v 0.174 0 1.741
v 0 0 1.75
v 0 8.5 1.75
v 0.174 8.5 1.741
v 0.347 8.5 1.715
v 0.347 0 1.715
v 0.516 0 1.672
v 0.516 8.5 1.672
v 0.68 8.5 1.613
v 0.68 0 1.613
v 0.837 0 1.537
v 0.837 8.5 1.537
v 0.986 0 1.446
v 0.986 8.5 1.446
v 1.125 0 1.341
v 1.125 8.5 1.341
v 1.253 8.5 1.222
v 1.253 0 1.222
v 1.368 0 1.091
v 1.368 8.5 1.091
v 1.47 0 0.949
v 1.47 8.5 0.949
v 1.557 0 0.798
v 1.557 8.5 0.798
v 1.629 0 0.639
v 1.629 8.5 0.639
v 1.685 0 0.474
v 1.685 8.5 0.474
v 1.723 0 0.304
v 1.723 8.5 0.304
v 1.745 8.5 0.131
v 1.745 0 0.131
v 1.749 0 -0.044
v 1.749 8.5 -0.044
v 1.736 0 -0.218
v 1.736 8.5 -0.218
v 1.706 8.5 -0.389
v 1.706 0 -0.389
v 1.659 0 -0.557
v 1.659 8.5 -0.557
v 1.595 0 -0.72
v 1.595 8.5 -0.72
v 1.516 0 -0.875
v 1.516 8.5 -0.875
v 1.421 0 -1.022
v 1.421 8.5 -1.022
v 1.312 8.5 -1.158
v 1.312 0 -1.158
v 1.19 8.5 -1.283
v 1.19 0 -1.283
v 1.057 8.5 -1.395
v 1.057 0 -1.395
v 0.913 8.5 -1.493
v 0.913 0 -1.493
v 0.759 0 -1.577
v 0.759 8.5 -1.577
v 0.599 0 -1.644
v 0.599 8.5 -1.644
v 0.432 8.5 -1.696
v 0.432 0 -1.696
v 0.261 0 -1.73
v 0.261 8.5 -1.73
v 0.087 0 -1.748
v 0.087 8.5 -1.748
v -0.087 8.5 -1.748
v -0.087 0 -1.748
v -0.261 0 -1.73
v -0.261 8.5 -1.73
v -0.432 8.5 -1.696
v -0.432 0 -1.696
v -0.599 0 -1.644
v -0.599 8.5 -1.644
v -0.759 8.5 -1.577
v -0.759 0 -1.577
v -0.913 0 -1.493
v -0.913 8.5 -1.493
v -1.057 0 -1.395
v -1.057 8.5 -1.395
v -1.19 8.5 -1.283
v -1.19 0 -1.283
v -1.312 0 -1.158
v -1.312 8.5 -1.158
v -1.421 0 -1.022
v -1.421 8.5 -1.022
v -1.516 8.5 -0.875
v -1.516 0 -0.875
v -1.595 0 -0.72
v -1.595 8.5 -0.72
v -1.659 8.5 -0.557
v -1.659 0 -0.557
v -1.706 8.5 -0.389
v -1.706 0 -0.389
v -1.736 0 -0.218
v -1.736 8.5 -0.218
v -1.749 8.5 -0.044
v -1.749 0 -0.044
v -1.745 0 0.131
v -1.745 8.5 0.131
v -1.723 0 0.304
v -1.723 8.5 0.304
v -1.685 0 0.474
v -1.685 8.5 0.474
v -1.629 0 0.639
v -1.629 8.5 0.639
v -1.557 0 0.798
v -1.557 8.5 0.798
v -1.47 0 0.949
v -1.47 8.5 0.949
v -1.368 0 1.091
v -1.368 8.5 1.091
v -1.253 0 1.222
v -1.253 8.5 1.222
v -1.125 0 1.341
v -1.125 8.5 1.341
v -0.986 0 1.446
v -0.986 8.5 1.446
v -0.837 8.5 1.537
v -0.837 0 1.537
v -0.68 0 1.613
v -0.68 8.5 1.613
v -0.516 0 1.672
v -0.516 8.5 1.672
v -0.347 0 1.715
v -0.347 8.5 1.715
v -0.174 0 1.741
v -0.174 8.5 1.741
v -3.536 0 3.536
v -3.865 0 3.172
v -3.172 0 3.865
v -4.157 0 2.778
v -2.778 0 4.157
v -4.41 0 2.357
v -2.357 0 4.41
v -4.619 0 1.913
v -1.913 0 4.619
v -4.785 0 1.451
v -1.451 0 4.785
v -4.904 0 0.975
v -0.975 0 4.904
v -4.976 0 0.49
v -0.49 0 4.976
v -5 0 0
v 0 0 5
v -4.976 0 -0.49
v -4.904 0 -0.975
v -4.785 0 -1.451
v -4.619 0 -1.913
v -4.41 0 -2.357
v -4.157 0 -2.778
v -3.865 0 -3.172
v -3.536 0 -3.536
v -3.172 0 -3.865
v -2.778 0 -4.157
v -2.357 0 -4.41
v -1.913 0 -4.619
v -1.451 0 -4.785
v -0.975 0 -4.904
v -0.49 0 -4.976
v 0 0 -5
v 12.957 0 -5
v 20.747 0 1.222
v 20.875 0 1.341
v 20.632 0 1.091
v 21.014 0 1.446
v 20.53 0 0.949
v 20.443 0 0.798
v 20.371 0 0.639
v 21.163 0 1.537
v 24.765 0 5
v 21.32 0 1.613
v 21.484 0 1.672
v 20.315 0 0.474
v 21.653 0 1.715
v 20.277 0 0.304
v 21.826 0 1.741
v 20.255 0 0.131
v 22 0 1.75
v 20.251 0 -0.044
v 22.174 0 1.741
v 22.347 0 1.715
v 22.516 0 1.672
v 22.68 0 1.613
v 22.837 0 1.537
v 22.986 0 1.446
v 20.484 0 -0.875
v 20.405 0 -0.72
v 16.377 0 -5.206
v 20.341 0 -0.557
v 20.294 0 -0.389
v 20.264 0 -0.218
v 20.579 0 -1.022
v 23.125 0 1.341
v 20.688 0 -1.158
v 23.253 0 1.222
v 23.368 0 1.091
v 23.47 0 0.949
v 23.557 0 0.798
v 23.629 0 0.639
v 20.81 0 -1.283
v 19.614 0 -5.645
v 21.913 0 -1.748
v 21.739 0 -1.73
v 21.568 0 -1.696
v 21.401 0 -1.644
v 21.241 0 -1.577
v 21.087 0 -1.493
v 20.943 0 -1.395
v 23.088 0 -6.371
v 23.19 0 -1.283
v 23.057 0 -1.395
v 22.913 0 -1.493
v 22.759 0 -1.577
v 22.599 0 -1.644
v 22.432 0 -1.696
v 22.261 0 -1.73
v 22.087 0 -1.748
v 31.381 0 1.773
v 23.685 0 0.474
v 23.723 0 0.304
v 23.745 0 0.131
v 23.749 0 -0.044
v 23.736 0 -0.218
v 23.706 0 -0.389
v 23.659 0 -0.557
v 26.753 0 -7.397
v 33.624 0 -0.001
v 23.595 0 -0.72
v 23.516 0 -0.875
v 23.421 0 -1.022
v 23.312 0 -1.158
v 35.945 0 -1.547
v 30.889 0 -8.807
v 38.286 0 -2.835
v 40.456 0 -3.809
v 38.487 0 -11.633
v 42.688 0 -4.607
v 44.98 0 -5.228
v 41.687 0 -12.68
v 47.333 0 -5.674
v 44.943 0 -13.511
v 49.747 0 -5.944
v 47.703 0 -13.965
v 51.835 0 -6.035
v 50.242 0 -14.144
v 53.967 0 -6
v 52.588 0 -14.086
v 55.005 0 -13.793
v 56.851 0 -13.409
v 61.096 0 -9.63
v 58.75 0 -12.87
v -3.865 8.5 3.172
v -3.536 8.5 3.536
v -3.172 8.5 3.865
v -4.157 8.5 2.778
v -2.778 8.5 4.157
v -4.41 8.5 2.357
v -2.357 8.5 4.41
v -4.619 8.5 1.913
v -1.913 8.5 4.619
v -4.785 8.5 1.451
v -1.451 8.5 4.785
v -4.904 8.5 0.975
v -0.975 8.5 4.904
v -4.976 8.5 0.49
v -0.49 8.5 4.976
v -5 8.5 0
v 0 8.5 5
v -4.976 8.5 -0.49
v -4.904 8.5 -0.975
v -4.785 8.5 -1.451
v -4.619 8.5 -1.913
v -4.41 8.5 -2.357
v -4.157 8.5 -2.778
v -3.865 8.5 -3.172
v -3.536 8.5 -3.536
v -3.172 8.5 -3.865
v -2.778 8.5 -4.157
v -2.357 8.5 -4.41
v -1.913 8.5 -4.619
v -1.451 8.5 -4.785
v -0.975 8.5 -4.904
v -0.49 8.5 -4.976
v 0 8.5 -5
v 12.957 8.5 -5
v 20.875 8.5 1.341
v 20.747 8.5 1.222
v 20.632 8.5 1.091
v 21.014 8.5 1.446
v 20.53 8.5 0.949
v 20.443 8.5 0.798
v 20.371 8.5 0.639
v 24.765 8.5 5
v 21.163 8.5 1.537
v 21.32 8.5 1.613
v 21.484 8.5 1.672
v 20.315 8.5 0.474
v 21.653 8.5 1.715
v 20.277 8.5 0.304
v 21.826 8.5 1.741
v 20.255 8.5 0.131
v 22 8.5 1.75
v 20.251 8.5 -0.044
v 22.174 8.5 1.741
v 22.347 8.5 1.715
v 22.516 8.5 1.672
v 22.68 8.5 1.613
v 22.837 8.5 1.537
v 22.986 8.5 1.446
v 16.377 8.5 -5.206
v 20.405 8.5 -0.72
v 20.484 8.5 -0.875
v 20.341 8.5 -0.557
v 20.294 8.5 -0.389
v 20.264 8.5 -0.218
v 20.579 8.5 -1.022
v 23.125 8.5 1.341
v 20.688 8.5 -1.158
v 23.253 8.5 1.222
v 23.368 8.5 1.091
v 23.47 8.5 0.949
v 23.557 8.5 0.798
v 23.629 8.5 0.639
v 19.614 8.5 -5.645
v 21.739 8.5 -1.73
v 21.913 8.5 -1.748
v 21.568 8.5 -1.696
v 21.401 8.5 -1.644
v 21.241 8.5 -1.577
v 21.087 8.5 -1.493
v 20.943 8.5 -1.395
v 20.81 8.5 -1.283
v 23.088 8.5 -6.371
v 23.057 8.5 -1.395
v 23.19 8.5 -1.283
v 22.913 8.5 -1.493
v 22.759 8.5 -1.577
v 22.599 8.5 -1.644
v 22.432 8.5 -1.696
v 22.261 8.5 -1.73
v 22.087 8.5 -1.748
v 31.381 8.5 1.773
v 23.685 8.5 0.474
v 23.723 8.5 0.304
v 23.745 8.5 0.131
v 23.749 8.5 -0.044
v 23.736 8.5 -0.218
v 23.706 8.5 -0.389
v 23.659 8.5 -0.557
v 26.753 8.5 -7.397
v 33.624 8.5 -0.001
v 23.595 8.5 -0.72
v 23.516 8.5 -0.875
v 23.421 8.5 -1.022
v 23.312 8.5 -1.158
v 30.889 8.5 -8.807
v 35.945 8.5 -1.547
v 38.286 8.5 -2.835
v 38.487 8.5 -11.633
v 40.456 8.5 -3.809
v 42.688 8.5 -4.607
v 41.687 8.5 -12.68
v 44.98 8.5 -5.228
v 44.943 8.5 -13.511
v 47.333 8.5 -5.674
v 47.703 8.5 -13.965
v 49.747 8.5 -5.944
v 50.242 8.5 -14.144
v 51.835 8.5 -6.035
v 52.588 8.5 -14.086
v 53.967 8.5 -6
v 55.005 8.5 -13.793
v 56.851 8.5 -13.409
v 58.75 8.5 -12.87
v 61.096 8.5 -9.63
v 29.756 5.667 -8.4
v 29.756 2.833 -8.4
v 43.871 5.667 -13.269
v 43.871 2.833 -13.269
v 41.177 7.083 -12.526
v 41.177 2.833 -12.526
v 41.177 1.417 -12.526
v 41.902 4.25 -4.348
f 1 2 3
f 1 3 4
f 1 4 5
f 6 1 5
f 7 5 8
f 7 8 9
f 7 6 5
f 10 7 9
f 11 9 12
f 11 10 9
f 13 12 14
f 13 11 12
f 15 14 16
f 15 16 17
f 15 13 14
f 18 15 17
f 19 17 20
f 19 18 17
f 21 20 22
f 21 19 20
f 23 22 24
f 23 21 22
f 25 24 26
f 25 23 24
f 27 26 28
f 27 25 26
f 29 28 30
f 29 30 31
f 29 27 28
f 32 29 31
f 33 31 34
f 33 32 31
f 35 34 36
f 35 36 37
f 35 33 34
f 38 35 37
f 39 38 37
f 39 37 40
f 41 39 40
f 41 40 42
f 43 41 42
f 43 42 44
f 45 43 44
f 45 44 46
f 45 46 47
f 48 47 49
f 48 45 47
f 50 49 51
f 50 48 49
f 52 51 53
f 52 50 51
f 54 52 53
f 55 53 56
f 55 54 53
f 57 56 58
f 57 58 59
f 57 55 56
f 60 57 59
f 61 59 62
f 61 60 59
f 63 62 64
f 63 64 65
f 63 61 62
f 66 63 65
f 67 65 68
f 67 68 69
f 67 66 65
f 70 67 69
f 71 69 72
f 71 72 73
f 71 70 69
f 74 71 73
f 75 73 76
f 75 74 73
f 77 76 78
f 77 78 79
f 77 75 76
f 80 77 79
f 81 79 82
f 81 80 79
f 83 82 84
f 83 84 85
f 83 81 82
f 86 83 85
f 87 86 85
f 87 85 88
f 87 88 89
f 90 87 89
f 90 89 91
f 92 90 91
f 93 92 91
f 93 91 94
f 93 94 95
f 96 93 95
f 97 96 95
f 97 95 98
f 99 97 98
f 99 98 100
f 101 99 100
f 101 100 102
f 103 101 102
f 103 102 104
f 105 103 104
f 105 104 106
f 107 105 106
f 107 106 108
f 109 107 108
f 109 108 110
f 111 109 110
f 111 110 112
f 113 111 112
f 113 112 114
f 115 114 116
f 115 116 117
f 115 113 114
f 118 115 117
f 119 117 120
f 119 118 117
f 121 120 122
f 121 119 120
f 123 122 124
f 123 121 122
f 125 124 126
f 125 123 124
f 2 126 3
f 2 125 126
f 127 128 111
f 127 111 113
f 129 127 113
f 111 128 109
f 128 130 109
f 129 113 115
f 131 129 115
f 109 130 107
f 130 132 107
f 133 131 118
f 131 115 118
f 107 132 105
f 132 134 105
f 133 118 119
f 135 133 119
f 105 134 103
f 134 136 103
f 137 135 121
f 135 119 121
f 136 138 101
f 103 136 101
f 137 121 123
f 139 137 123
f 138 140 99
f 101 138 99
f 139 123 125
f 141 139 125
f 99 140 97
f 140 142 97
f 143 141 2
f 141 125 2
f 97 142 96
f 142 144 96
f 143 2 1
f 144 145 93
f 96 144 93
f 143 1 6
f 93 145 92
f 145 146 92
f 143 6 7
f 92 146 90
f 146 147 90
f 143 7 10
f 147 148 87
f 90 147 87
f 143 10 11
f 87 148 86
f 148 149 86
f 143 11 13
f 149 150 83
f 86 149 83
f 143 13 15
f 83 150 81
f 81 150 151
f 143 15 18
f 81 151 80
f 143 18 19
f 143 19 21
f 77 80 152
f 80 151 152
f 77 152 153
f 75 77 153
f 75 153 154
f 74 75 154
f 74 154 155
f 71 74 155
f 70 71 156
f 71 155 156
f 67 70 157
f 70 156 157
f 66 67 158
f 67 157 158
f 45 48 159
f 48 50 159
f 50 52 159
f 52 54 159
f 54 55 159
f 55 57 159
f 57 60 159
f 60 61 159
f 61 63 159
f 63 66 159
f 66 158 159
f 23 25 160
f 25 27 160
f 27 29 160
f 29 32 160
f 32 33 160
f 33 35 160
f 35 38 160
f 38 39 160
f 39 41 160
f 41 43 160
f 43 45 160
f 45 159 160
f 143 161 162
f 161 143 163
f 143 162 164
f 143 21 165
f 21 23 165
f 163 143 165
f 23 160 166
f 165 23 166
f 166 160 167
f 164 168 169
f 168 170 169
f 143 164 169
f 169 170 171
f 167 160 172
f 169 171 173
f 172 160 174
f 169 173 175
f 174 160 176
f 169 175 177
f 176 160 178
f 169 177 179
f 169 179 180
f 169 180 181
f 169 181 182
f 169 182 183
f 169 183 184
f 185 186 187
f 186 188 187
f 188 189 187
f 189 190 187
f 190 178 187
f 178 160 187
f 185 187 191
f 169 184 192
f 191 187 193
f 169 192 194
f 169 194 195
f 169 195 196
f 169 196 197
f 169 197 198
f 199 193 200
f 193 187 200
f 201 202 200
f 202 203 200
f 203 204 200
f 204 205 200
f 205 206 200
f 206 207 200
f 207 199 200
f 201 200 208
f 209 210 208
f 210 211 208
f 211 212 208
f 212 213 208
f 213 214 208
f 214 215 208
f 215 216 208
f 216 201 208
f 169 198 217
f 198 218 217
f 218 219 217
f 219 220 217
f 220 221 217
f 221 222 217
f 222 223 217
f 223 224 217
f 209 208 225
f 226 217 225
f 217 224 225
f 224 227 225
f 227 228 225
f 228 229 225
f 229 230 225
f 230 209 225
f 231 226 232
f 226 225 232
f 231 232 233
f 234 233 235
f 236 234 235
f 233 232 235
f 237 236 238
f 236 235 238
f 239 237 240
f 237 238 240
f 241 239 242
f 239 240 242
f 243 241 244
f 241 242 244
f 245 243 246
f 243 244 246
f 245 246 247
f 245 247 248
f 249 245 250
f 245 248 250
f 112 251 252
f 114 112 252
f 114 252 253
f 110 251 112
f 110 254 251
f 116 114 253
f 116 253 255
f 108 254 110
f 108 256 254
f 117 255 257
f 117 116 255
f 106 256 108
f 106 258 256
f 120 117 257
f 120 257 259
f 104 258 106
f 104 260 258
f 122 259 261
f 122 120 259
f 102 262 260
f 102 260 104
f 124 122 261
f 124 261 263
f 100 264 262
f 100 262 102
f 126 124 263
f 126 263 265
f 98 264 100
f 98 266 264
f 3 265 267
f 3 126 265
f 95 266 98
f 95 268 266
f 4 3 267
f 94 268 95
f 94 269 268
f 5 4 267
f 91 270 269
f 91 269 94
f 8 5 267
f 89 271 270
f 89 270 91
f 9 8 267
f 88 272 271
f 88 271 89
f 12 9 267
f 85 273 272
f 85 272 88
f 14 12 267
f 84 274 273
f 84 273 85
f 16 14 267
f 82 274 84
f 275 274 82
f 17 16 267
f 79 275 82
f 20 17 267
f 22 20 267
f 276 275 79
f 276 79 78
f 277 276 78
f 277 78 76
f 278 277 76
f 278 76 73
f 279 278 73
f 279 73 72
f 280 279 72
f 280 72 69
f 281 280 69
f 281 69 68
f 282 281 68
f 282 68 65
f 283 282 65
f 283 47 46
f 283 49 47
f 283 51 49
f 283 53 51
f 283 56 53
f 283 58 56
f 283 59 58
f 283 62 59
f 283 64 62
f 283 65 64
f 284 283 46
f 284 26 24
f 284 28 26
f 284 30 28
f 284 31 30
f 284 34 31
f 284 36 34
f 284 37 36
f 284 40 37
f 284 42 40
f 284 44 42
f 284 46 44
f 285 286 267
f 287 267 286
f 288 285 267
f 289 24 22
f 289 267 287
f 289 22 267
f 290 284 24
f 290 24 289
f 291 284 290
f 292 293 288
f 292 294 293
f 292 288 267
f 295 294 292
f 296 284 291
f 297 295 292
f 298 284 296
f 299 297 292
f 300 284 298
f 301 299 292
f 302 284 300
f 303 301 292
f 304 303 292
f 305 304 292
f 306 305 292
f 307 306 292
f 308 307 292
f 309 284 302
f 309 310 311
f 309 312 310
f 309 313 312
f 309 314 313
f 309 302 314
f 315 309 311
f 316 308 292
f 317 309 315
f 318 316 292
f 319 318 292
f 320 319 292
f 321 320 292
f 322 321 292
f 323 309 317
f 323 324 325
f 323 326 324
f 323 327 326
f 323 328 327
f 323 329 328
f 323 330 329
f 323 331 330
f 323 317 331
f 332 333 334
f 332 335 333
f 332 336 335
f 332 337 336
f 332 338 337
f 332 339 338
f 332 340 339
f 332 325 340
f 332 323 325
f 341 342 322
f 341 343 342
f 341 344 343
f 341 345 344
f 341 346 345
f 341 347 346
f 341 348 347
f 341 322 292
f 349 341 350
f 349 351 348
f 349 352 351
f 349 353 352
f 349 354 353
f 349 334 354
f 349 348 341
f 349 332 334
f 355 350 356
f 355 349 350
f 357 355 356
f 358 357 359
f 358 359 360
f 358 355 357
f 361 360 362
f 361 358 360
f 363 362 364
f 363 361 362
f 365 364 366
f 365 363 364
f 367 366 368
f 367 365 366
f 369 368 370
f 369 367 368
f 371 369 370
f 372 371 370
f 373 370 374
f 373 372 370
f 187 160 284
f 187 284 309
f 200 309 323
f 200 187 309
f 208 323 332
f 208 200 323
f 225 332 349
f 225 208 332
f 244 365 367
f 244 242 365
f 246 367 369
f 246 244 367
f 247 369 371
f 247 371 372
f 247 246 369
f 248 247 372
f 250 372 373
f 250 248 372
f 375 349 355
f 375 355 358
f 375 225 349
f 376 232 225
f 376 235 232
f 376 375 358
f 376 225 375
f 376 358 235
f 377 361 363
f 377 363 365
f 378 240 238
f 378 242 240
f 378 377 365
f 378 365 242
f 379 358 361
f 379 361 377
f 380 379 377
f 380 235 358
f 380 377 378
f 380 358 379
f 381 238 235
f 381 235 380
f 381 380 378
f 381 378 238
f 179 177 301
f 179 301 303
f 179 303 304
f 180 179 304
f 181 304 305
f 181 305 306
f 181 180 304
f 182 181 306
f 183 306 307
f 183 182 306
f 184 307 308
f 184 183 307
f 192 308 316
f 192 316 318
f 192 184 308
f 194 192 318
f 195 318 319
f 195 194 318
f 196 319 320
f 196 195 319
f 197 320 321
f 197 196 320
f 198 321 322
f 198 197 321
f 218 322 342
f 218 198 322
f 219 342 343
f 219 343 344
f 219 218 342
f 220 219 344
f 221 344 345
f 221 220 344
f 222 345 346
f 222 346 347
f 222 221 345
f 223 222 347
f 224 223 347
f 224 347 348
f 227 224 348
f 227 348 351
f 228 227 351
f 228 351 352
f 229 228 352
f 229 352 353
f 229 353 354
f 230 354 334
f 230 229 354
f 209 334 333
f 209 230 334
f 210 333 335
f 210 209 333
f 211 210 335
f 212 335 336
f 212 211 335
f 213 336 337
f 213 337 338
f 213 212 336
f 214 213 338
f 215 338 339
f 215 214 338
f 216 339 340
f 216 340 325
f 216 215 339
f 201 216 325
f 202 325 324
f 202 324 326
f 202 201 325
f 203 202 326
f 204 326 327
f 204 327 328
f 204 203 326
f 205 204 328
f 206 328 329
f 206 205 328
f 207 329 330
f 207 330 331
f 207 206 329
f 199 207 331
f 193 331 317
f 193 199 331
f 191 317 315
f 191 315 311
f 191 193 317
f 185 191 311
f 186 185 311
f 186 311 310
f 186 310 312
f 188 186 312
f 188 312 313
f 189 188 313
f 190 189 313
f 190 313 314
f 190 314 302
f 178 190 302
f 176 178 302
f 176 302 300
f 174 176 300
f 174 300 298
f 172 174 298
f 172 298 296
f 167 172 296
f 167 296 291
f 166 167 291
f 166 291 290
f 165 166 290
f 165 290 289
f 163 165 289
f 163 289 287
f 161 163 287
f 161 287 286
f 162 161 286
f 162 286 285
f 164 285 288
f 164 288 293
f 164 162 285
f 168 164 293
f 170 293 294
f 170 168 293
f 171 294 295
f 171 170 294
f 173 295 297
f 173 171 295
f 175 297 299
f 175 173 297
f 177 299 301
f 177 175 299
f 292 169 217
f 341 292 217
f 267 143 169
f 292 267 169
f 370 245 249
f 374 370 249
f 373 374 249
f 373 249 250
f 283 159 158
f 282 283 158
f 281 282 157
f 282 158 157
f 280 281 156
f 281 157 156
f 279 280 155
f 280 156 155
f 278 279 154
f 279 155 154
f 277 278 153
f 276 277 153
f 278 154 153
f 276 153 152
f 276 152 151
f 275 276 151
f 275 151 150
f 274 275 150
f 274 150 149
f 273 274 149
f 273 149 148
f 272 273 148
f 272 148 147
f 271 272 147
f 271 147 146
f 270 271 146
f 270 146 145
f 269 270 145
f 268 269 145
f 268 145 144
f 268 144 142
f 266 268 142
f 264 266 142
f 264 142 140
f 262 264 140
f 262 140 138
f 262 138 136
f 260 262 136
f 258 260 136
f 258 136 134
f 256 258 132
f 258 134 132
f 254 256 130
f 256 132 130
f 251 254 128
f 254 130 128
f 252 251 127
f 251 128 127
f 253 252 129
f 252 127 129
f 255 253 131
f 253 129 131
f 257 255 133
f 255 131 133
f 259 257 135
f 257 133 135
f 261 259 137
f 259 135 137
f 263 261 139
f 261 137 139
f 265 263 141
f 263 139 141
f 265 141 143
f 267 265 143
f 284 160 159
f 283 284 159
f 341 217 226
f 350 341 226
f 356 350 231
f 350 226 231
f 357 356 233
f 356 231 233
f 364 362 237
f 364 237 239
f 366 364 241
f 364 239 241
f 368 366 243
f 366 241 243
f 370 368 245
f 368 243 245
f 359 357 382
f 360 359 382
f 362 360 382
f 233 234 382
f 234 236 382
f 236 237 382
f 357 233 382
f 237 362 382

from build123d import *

# Parameters (mm, degrees)
SKETCH2_R           = 5
SKETCH2_R_2         = 1.75
BOSS_EXTRUDE1_DEPTH = 8.5
BOSS_EXTRUDE2_START = -8.5
BOSS_EXTRUDE2_DEPTH = 8.5


with BuildPart() as part:
    # Sketch2 → Boss-Extrude1 (new body)
    # profile 1 of 3: a face of its own
    with BuildSketch(Plane(origin=(0, 0, 0), x_dir=(1, 0, 0), z_dir=(0, 1, 0))):
        Circle(SKETCH2_R)
        with Locations(Location((0, 0, 0), (0, 0, 270))):
            Circle(SKETCH2_R_2, mode=Mode.SUBTRACT)
    # profile 2 of 3: a face of its own
    with BuildSketch(Plane(origin=(0, 0, 0), x_dir=(1, 0, 0), z_dir=(0, 1, 0))):
        with BuildLine():
            Line((22, 5), (0, 5))
            ThreePointArc((0, 5), (3.535533906, 3.535533906), (5, 0))
            ThreePointArc((5, 0), (3.535533906, -3.535533906), (0, -5))
            Line((0, -5), (22, -5))
            ThreePointArc((22, -5), (17, 0), (22, 5))
        make_face()
    # profile 3 of 3: a face of its own
    with BuildSketch(Plane(origin=(0, 0, 0), x_dir=(1, 0, 0), z_dir=(0, 1, 0))):
        with Locations((22, 0)):
            Circle(SKETCH2_R)
        with Locations(Location((22, 0, 0), (0, 0, 270))):
            Circle(SKETCH2_R_2, mode=Mode.SUBTRACT)
    extrude(amount=BOSS_EXTRUDE1_DEPTH)

    # Sketch3 → Boss-Extrude2 (add)
    with BuildSketch(Plane(origin=(0, 8.5, 0), x_dir=(1, 0, 0), z_dir=(0, 1, 0)).offset(BOSS_EXTRUDE2_START)):
        with BuildLine():
            ThreePointArc((22, 5), (27, 0), (22, -5))
            Line((22, -5), (24.765014751, -5))
            Line((24.765014751, -5), (31.381419164, -1.772963949))
            add(Edge.make_bspline(
                [(31.381419164, -1.772963949), (41.129259451, 6.582699459), (53.966862985, 6)],
                knots=[0, 0, 0, 1, 1, 1], degree=2))
            Line((53.966862985, 6), (61.095847858, 9.630092929))
            Line((61.095847858, 9.630092929), (58.75, 12.87))
            add(Edge.make_bspline(
                [(12.956629398, 5), (32.247892428, 5.420652932), (42.340471259, 18.148408487), (58.75, 12.87)],
                knots=[0.03219955, 0.03219955, 0.03219955, 0.03219955, 1, 1, 1, 1], degree=3))
            Line((12.956629398, 5), (22, 5))
        make_face()
    extrude(amount=BOSS_EXTRUDE2_DEPTH)


solid = part.part
